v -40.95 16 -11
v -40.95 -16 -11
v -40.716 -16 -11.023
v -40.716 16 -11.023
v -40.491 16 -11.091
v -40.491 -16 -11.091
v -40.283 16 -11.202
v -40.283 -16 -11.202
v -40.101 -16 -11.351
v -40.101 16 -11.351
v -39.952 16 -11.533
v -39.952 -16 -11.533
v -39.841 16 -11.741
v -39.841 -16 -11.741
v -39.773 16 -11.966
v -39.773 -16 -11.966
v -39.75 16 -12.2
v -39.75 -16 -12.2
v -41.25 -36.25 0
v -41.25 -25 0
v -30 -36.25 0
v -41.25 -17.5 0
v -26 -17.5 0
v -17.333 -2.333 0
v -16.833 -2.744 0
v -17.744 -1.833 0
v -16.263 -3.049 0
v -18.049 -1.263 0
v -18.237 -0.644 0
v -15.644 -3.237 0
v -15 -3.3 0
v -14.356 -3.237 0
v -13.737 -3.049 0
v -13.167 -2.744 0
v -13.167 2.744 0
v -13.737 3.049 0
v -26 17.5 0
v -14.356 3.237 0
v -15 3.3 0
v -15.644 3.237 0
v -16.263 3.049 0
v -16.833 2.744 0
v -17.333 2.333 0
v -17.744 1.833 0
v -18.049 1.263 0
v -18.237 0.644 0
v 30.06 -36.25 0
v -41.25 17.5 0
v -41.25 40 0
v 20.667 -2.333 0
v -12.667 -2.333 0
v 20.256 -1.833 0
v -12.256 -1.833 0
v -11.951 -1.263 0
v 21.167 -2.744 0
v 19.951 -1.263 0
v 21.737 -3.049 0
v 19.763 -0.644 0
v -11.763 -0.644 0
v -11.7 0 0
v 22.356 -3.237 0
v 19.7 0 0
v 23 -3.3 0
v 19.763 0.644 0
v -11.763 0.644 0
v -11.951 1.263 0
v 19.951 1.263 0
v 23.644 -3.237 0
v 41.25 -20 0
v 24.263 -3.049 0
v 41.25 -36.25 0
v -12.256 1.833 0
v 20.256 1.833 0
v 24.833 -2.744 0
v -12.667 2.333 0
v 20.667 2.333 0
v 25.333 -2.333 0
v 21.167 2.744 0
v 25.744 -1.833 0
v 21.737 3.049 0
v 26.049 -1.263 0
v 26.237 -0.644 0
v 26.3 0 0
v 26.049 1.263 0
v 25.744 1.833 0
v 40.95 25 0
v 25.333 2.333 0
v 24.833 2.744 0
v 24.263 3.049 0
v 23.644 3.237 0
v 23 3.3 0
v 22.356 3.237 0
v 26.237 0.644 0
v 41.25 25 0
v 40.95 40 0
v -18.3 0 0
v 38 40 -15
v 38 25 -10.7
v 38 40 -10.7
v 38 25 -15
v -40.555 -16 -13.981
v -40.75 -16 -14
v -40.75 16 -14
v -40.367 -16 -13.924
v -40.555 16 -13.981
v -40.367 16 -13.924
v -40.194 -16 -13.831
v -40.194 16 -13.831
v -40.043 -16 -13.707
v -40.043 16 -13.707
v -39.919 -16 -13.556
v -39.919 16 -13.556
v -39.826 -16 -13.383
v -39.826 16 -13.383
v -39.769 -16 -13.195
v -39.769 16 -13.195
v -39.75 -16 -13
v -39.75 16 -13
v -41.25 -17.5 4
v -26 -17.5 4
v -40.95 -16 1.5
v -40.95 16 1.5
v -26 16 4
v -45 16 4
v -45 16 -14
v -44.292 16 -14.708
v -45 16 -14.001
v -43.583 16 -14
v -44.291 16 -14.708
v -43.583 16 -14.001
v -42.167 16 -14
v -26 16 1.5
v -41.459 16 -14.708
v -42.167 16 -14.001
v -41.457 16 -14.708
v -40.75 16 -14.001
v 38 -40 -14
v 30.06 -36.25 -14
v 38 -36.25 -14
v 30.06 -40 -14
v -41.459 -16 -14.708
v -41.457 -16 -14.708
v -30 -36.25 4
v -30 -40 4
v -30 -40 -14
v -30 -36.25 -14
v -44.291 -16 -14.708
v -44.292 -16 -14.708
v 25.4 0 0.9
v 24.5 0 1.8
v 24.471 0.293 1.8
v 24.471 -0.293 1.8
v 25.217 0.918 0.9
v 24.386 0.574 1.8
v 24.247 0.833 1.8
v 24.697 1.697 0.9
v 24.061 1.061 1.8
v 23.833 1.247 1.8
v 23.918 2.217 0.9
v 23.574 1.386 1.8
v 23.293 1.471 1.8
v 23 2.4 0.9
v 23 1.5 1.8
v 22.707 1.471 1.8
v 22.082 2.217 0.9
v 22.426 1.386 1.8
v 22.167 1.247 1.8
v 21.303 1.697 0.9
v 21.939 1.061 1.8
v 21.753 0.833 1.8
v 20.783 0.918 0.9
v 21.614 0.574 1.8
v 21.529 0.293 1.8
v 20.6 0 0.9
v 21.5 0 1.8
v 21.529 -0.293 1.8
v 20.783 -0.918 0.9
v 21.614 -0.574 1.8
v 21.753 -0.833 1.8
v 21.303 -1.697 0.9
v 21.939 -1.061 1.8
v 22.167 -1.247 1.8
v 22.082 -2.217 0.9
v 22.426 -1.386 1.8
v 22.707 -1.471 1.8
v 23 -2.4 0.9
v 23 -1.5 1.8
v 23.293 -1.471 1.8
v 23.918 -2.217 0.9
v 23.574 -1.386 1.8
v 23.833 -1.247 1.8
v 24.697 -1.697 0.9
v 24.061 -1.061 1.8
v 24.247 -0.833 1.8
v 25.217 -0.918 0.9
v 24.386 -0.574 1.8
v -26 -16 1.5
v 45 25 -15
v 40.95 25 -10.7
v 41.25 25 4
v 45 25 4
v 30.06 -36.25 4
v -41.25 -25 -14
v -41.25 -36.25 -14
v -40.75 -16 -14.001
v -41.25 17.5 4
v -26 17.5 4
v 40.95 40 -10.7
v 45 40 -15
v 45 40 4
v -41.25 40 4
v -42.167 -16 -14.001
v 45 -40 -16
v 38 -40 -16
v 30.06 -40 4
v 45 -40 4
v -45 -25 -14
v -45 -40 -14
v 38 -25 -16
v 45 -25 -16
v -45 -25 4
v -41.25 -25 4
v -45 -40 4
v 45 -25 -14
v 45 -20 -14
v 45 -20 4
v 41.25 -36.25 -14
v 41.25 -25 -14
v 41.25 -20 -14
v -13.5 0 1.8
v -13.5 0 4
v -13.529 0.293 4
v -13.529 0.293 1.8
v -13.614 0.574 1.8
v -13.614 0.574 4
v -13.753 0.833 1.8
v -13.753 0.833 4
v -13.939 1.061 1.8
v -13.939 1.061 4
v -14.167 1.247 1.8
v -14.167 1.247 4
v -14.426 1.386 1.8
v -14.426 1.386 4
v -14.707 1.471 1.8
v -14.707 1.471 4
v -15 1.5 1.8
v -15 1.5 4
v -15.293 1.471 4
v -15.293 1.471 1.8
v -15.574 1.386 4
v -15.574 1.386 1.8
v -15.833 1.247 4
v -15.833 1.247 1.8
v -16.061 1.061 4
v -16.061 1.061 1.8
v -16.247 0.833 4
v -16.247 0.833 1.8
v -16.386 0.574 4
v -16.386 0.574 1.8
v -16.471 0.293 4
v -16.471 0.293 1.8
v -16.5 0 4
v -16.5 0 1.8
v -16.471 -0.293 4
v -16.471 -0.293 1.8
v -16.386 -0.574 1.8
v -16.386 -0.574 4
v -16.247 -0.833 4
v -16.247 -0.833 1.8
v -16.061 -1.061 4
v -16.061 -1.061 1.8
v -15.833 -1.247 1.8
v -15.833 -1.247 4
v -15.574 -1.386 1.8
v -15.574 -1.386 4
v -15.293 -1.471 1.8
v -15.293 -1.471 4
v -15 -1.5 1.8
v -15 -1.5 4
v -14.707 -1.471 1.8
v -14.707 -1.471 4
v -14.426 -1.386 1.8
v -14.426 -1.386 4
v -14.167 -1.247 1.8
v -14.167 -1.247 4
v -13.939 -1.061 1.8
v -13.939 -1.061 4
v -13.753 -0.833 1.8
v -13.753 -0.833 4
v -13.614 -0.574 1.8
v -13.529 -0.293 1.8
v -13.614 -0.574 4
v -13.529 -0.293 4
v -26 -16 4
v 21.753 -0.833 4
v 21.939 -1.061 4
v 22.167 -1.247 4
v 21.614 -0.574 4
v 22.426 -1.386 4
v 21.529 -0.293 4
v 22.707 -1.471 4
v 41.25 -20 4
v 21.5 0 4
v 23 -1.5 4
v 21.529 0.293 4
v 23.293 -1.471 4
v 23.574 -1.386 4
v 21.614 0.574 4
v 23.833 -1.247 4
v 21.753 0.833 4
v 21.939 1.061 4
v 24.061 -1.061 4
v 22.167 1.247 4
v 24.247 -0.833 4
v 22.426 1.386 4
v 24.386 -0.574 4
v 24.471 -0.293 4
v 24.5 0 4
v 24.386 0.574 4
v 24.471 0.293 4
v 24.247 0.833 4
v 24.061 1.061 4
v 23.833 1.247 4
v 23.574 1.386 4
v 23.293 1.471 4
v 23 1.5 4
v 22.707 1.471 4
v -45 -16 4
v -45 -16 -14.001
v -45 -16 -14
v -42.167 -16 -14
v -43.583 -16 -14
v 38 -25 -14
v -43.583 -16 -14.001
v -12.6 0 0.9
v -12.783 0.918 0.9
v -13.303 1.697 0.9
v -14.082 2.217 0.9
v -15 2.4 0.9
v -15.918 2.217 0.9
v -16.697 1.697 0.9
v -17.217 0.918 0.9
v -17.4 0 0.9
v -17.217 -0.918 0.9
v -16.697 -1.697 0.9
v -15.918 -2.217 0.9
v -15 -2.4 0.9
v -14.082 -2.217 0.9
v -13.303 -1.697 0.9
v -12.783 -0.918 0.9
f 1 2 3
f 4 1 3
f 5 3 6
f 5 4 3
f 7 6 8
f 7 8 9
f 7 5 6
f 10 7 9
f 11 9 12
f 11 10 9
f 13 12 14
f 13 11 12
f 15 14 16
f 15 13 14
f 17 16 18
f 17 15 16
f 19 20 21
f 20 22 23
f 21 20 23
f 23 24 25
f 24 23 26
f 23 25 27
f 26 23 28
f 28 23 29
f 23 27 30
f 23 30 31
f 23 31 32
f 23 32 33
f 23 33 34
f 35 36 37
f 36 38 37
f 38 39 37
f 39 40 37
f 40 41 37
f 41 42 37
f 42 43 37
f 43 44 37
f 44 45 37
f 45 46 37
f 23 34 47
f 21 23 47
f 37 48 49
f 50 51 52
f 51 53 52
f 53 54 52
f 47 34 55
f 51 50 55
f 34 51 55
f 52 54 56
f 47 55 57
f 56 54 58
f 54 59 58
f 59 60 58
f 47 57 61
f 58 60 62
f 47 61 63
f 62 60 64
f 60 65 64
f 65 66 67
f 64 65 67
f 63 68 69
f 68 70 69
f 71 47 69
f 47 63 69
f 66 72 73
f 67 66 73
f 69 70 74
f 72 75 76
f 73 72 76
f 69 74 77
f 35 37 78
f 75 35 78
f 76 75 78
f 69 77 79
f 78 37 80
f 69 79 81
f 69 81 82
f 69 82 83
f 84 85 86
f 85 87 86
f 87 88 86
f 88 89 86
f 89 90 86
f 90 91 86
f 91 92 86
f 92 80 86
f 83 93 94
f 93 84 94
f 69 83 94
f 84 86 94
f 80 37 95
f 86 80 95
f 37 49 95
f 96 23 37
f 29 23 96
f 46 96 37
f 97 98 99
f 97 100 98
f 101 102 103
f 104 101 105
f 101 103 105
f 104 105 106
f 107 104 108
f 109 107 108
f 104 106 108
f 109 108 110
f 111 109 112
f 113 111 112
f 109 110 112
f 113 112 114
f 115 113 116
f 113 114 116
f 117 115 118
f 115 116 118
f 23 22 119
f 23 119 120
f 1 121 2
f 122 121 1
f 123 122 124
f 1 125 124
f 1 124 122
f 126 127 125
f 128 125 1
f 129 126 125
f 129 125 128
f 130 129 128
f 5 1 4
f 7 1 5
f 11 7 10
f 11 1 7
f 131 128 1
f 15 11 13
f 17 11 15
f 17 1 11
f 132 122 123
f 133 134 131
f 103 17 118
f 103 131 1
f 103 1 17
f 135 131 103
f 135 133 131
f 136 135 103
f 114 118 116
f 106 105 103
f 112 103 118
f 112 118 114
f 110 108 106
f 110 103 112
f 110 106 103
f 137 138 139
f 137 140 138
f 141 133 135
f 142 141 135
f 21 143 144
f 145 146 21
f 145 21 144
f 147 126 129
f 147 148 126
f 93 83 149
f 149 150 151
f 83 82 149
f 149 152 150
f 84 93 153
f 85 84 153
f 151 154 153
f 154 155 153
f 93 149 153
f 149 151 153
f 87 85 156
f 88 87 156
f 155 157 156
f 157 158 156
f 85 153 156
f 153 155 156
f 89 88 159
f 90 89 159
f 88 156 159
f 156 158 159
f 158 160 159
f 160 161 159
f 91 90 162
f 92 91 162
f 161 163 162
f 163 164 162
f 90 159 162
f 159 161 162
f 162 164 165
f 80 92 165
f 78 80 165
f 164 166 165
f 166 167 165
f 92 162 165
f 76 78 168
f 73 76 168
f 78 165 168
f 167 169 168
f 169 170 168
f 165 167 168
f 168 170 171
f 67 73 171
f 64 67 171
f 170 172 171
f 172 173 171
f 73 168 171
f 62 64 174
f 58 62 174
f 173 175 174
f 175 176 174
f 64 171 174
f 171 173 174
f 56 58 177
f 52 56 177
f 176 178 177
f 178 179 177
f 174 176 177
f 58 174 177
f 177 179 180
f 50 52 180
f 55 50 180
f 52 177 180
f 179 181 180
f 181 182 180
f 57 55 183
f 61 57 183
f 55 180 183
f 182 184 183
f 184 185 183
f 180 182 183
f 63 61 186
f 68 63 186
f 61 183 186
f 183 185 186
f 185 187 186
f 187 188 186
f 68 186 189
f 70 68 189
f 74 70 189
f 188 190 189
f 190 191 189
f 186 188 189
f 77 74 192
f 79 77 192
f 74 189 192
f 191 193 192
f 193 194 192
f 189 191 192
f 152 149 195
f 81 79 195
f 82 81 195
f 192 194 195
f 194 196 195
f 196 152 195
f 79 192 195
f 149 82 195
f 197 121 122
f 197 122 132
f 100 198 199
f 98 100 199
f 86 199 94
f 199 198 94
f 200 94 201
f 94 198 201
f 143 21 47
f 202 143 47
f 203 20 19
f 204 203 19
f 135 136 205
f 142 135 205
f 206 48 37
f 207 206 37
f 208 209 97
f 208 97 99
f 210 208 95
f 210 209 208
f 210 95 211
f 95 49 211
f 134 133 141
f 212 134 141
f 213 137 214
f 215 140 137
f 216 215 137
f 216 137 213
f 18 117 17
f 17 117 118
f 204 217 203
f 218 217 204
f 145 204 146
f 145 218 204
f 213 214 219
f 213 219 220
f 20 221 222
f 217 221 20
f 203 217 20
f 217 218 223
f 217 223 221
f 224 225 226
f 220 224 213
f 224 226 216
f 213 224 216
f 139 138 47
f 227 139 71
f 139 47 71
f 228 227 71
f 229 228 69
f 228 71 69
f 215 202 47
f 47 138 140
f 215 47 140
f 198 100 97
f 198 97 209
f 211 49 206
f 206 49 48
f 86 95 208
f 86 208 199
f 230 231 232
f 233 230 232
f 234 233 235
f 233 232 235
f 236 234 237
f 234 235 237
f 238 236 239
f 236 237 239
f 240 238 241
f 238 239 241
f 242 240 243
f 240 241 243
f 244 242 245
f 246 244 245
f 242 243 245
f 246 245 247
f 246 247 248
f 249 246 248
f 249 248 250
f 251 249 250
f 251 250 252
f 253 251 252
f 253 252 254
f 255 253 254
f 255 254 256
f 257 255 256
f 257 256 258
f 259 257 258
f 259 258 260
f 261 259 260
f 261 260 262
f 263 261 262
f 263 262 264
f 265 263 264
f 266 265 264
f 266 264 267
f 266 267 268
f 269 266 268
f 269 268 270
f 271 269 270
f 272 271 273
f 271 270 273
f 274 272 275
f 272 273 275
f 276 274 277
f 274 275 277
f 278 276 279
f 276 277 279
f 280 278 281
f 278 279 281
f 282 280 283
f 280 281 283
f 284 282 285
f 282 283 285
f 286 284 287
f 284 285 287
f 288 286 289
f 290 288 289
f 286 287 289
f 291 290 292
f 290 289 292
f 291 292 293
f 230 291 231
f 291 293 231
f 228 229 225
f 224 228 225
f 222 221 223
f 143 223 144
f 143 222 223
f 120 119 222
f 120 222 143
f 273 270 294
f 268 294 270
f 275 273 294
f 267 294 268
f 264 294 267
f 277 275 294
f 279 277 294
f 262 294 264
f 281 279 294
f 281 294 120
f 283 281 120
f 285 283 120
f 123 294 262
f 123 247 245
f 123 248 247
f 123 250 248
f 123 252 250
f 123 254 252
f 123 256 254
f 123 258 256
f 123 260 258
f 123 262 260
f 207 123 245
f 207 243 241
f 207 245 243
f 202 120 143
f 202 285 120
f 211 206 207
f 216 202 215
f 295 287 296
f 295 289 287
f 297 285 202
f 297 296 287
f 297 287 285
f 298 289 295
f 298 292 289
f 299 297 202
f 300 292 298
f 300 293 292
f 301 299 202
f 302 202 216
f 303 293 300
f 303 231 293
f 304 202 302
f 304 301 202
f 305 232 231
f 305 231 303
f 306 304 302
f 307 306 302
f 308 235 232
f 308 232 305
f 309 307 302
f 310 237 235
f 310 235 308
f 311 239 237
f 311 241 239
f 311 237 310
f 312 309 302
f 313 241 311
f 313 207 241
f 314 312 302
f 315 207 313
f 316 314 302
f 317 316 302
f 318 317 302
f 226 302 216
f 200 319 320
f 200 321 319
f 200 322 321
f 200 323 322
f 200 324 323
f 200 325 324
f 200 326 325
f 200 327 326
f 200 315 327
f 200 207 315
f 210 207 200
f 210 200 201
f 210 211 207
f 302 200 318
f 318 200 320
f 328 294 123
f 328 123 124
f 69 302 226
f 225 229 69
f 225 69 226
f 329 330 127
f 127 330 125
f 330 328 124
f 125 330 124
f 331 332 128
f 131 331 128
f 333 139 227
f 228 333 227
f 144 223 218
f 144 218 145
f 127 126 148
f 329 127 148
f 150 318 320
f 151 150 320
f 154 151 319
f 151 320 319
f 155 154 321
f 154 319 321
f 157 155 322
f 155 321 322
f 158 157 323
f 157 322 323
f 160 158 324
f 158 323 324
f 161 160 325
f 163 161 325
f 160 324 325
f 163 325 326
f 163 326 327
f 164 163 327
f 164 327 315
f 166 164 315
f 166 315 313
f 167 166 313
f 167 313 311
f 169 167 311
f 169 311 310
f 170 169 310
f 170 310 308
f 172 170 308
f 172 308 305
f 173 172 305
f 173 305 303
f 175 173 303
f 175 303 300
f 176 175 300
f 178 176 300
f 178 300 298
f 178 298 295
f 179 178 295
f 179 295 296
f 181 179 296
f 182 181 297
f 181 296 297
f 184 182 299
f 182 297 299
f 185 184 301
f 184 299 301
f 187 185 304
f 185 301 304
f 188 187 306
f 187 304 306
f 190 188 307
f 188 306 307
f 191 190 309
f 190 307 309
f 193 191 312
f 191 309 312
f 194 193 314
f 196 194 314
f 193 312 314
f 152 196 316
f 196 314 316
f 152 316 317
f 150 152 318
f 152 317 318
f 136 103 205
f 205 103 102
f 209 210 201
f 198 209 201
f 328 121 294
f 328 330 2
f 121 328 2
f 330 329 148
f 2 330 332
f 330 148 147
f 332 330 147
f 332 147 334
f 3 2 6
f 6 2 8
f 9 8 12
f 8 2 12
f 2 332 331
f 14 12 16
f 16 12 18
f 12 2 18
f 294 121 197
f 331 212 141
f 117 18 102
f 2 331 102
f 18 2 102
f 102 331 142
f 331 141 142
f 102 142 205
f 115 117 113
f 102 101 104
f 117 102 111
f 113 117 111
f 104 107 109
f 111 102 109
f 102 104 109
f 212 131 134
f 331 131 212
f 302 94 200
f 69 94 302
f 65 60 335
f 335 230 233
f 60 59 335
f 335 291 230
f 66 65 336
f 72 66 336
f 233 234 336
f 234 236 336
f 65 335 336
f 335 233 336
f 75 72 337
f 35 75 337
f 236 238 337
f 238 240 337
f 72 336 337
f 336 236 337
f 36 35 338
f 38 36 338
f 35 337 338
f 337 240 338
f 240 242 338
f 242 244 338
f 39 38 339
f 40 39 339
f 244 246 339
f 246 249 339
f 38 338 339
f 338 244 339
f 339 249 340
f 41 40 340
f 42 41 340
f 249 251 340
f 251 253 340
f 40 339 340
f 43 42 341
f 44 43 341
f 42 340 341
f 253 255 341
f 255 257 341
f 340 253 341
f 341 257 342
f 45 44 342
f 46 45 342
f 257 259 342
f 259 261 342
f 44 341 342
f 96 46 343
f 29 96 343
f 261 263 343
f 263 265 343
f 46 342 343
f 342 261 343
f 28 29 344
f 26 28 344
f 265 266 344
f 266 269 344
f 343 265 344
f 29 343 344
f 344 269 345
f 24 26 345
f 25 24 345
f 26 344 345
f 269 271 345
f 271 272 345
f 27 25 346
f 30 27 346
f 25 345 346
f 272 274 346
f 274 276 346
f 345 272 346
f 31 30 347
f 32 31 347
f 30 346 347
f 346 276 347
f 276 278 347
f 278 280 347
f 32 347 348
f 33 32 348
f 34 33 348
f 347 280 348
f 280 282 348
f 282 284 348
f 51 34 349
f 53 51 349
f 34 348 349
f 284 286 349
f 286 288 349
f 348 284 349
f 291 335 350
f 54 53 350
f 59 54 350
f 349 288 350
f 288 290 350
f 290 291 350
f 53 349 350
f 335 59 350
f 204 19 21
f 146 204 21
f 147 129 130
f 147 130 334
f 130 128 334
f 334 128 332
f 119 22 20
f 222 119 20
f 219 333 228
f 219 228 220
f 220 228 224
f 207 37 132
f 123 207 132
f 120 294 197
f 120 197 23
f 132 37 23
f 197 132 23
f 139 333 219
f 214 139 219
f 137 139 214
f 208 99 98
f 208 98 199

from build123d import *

# Parameters (mm, degrees)
F0_W      = 90
F0_H      = 80
F1_DEPTH  = 4
F2_R      = 1.5
F3_DEPTH  = 4.001
F5_DEPTH  = 14
F6_W      = 7
F6_H      = 15
F7_DEPTH  = 2
F8_W      = 3.75
F8_H      = 60
F9_DEPTH  = 2
F10_W     = 3.75
F10_H     = 15
F10_W_2   = 3.25
F11_DEPTH = 3
F12_W     = 3.75
F12_H     = 45
F13_DEPTH = 16.001
F14_W     = 19
F14_H     = 1.5
F15_DEPTH = 25
F16_W     = 3.75
F16_H     = 22.5
F17_DEPTH = 25
F18_W     = 32
F18_H     = 2
F19_DEPTH = 1.5
F20_R     = 1
F21_W     = 1.4166666667
F21_H     = 32
F22_DEPTH = 0.7085
F23_SIZE  = 0.7075
F24_SIZE  = 1.8
F25_W     = 3.75
F25_H     = 7.5
F25_W_2   = 60.0602255464
F25_H_2   = 3.75
F26_DEPTH = 25
F27_W     = 15.25
F27_H     = 32
F28_DEPTH = 1.5
F29_W     = 32
F29_H     = 13.5
F30_DEPTH = 0.3
F31_W     = 3.25
F31_H     = 15
F32_DEPTH = 1.3
F33_W     = 15
F33_H     = 10.7
F34_DEPTH = 0.3
F35_W     = 1.2
F35_H     = 32
F36_DEPTH = 1
F37_R     = 1.19999


# Not quite as in the source:
# - a fillet or chamfer is up to 0.001 mm smaller than in the source, because OpenCascade refuses the exact size
# - a feature names something its author has since deleted; it is built from what else it names


with BuildPart() as f1:
    # F0 (on Top) → F1 (new body)
    with BuildSketch(Plane.XY):
        Rectangle(F0_W, F0_H)
    extrude(amount=F1_DEPTH)

    # F2 (on face) → F3 (cut, through all)
    with BuildSketch(Plane.XY.offset(4)):
        with Locations((23, 0)):
            Circle(F2_R)
        with Locations((-15, 0)):
            Circle(F2_R)
    extrude(amount=-F3_DEPTH, mode=Mode.SUBTRACT)

    # F4 (on face) → F5 (join)
    with BuildSketch(Plane(origin=(0, 0, 0), x_dir=(1, 0, 0), z_dir=(0, 0, -1))):
        Polygon((-41.25, -36.25), (-41.25, 36.25), (-30, 36.25), (-30, 40), (-45, 40), (-45, -40), (-41.25, -40), align=None)
        Polygon((45, 40), (30, 40), (30, 36.25), (41.25, 36.25), (41.25, -36.25), (41.25, -40), (45, -40), align=None)
    extrude(amount=F5_DEPTH)

    # F6 (on face) → F7 (join)
    with BuildSketch(Plane(origin=(0, 0, -14), x_dir=(1, 0, 0), z_dir=(0, 0, -1))):
        with Locations((41.5, 32.5)):
            Rectangle(F6_W, F6_H)
    extrude(amount=F7_DEPTH)

    # F8 (on face) → F9 (cut)
    with BuildSketch(Plane(origin=(0, 0, -14), x_dir=(1, 0, 0), z_dir=(0, 0, -1))):
        with Locations((43.125, -10)):
            Rectangle(F8_W, F8_H)
    extrude(amount=-F9_DEPTH, mode=Mode.SUBTRACT)

    # F10 (on face) → F11 (join)
    with BuildSketch(Plane(origin=(0, 0, -12), x_dir=(1, 0, 0), z_dir=(0, 0, -1))):
        with Locations((43.125, -32.5)):
            Rectangle(F10_W, F10_H)
        with Locations((39.625, -32.5)):
            Rectangle(F10_W_2, F10_H)
    extrude(amount=F11_DEPTH)

    # F12 (on face) → F13 (cut, through all)
    with BuildSketch(Plane(origin=(0, 0, -12), x_dir=(1, 0, 0), z_dir=(0, 0, -1))):
        with Locations((43.125, -2.5)):
            Rectangle(F12_W, F12_H)
    extrude(amount=-F13_DEPTH, mode=Mode.SUBTRACT)

    # F14 (on face) → F15 (cut)
    with BuildSketch(Plane(origin=(0, 0, -14), x_dir=(1, 0, 0), z_dir=(0, 0, -1))):
        with Locations((-35.5, 16.75)):
            Rectangle(F14_W, F14_H)
        with Locations((-35.5, -16.75)):
            Rectangle(F14_W, F14_H)
    extrude(amount=-F15_DEPTH, mode=Mode.SUBTRACT)

    # F16 (on face) → F17 (cut)
    with BuildSketch(Plane(origin=(0, 0, -14), x_dir=(1, 0, 0), z_dir=(0, 0, -1))):
        with Locations((-43.125, -28.75)):
            Rectangle(F16_W, F16_H)
    extrude(amount=-F17_DEPTH, mode=Mode.SUBTRACT)

    # F18 (on face) → F19 (join)
    with BuildSketch(Plane.YZ.offset(-41.25)):
        with Locations((0, -13)):
            Rectangle(F18_W, F18_H)
    extrude(amount=F19_DEPTH)

    # F20
    f20_edges = [f1.edges().sort_by_distance(p)[0] for p in [
        (-39.75, 0, -14),
    ]]
    fillet(f20_edges, radius=F20_R)

    # F21 (on face) → F22 (join)
    with BuildSketch(Plane(origin=(0, 0, -14), x_dir=(1, 0, 0), z_dir=(0, 0, -1))):
        with Locations((-41.4583333333, 0)):
            Rectangle(F21_W, F21_H)
        with Locations((-44.2916666667, 0)):
            Rectangle(F21_W, F21_H)
    extrude(amount=F22_DEPTH)

    # F23 (size 0.7085 in the source; OpenCascade refuses exactly that, so slightly less here)
    f23_edges = [f1.edges().sort_by_distance(p)[0] for p in [
        (-40.75, 0, -14.7085),
        (-42.166667, 0, -14.7085),
        (-43.583333, 0, -14.7085),
        (-45, 0, -14.7085),
    ]]
    chamfer(f23_edges, length=F23_SIZE)

    # F24
    f24_edges = [f1.edges().sort_by_distance(p)[0] for p in [
        (-16.5, 0, 0),
        (21.5, 0, 0),
    ]]
    chamfer(f24_edges, length=F24_SIZE)

    # F25 (on face) → F26 (cut)
    with BuildSketch(Plane(origin=(0, 0, -14), x_dir=(1, 0, 0), z_dir=(0, 0, -1))):
        with Locations((-43.125, 21.25)):
            Rectangle(F25_W, F25_H)
        with Locations((0.0301127732, 38.125)):
            Rectangle(F25_W_2, F25_H_2)
    extrude(amount=-F26_DEPTH, mode=Mode.SUBTRACT)

    # F27 (on face) → F28 (cut)
    with BuildSketch(Plane(origin=(0, 0, 0), x_dir=(1, 0, 0), z_dir=(0, 0, -1))):
        with Locations((-33.625, 0)):
            Rectangle(F27_W, F27_H)
    extrude(amount=-F28_DEPTH, mode=Mode.SUBTRACT)

    # F29 (on face) → F30 (join)
    with BuildSketch(Plane.YZ.offset(-41.25)):
        with Locations((0, -5.25)):
            Rectangle(F29_W, F29_H)
    extrude(amount=F30_DEPTH)

    # F31 (on face) → F32 (join)
    with BuildSketch(Plane.XY.offset(-12)):
        with Locations((39.625, 32.5)):
            Rectangle(F31_W, F31_H)
    extrude(amount=F32_DEPTH)

    # F33 (on face) → F34 (join)
    with BuildSketch(Plane(origin=(41.25, 0, 0), x_dir=(0, -1, 0), z_dir=(-1, 0, 0))):
        with Locations((-32.5, -5.35)):
            Rectangle(F33_W, F33_H)
    extrude(amount=F34_DEPTH)

    # F35 (on face) → F36 (join)
    with BuildSketch(Plane.XY.offset(-12)):
        with Locations((-40.35, 0)):
            Rectangle(F35_W, F35_H)
    extrude(amount=F36_DEPTH)

    # F37 (radius 1.2 in the source; OpenCascade refuses exactly that, so slightly less here)
    f37_edges = [f1.edges().sort_by_distance(p)[0] for p in [
        (-39.75, 0, -11),
    ]]
    fillet(f37_edges, radius=F37_R)


solid = f1.part
